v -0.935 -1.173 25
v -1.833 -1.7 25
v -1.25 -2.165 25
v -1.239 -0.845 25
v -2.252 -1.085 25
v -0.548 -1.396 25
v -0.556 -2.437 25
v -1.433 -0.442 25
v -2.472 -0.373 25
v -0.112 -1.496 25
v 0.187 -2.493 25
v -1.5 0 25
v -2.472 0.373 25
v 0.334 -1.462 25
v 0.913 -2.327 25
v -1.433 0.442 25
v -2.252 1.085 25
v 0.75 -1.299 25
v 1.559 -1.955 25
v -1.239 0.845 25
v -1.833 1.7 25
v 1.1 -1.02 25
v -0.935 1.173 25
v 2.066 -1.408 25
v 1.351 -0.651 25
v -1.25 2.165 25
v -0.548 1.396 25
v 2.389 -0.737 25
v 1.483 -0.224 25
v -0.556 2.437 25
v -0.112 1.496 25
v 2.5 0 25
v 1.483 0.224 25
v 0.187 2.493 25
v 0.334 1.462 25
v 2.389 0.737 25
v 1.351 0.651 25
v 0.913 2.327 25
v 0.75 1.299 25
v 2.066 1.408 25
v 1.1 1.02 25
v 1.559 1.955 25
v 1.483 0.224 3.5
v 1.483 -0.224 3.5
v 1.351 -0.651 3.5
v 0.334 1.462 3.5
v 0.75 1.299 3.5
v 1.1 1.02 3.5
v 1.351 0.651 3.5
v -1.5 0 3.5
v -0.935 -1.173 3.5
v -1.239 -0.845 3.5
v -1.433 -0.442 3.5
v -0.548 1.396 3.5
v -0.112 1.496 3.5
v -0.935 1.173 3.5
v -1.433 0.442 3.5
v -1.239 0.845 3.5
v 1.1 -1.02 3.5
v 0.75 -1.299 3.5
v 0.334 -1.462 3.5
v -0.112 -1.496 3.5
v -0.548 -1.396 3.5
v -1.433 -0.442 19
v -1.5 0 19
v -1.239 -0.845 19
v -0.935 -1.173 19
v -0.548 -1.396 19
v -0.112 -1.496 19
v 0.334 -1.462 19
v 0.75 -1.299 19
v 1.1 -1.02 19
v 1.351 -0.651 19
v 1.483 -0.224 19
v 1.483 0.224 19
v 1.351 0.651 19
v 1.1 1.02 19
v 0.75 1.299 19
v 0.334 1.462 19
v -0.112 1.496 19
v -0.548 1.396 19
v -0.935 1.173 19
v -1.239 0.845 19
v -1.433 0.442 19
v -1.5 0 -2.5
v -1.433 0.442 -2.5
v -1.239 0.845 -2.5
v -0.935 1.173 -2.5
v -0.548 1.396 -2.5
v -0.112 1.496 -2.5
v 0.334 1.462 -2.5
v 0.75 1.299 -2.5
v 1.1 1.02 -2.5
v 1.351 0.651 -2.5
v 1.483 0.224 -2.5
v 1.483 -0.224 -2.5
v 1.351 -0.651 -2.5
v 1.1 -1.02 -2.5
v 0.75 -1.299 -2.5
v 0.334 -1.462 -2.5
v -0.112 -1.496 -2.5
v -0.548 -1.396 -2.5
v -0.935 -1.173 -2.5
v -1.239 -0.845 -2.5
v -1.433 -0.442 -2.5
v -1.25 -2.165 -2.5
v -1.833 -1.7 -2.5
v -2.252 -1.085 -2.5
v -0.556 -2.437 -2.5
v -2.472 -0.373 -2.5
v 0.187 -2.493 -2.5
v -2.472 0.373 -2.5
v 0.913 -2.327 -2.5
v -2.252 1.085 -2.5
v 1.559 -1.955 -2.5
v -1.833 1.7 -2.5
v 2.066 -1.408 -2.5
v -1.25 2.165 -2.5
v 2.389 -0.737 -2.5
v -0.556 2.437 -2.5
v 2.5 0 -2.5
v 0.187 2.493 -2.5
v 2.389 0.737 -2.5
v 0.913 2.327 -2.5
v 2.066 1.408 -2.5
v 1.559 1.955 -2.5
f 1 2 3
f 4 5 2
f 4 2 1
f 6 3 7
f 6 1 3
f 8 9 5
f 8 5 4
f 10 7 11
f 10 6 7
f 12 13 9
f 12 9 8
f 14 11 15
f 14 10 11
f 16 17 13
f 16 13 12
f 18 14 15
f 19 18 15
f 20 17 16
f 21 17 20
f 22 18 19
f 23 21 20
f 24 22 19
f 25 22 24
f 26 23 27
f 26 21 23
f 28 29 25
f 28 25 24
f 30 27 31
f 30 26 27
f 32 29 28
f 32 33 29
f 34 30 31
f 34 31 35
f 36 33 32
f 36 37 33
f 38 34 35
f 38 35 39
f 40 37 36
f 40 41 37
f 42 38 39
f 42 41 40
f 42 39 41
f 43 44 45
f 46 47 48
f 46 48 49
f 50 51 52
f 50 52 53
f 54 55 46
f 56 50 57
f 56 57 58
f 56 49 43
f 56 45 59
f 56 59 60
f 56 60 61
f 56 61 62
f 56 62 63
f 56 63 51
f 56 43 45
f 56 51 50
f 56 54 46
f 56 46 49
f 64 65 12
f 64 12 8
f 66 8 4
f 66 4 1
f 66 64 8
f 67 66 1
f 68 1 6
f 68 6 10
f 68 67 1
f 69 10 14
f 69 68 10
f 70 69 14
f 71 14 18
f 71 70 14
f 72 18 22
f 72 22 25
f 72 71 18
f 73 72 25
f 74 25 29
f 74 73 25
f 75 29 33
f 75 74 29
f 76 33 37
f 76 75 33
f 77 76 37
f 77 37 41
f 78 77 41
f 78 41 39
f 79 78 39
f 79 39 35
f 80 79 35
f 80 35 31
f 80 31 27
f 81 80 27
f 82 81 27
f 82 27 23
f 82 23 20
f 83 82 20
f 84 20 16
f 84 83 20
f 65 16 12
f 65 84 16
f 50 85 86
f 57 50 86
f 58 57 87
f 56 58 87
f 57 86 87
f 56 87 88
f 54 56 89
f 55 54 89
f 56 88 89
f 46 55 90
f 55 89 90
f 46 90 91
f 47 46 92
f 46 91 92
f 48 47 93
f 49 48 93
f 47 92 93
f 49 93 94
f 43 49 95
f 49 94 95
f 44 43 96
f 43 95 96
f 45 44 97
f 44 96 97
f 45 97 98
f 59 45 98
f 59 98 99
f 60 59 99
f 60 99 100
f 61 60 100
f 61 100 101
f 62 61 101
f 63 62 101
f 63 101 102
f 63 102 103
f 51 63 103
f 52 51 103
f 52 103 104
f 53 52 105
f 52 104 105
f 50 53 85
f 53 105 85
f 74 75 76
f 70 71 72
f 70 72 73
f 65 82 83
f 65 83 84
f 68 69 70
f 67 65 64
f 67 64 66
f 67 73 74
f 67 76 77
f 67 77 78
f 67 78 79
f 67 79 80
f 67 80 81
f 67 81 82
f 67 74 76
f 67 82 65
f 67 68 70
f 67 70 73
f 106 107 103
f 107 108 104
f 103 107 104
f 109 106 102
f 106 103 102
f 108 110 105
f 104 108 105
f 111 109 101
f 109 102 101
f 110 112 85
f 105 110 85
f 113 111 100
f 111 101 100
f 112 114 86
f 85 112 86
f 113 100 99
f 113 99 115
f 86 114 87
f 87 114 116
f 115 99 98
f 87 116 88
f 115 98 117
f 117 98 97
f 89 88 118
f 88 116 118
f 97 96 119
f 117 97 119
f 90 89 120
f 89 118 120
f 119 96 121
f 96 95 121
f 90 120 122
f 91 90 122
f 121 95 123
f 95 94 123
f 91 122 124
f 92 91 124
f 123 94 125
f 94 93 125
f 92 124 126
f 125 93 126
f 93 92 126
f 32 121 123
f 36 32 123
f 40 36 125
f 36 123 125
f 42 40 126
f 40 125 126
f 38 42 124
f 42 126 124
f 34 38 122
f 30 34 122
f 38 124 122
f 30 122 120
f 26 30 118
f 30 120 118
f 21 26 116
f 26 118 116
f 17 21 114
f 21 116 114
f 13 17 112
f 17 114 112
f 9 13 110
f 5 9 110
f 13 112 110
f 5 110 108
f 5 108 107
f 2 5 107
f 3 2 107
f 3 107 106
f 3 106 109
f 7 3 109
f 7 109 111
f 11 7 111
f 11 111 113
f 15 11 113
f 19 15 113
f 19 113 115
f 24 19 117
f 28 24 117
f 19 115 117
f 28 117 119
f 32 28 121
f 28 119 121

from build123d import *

# Parameters (mm, degrees)
BOSS_EXTRUDE1_DEPTH      = 25
BOSS_EXTRUDE1_DEPTH_BACK = 2.5
SKETCH1_R                = 2.5
SKETCH3_R                = 1.5
CUT_EXTRUDE1_DEPTH       = 6
CUT_EXTRUDE2_START       = -6
SKETCH2_R                = 1.5
CUT_EXTRUDE2_DEPTH       = 6


with BuildPart() as part:
    # Sketch1 → Boss-Extrude1 (new, two sides: drawn at the far end of the back side and taken through both)
    with BuildSketch(Plane.XY.offset(-BOSS_EXTRUDE1_DEPTH_BACK)):
        Circle(SKETCH1_R)
    extrude(amount=BOSS_EXTRUDE1_DEPTH + BOSS_EXTRUDE1_DEPTH_BACK)

    # Sketch3 → Cut-Extrude1 (cut)
    with BuildSketch(Plane(origin=(0, 0, -2.5), x_dir=(-1, 0, 0), z_dir=(0, 0, -1))):
        Circle(SKETCH3_R)
    extrude(amount=-CUT_EXTRUDE1_DEPTH, mode=Mode.SUBTRACT)

    # Sketch2 → Cut-Extrude2 (cut)
    with BuildSketch(Plane.XY.offset(25).offset(CUT_EXTRUDE2_START)):
        with Locations(Location((0, 0, 0), (0, 0, 180))):
            Circle(SKETCH2_R)
    extrude(amount=CUT_EXTRUDE2_DEPTH, mode=Mode.SUBTRACT)


solid = part.part
